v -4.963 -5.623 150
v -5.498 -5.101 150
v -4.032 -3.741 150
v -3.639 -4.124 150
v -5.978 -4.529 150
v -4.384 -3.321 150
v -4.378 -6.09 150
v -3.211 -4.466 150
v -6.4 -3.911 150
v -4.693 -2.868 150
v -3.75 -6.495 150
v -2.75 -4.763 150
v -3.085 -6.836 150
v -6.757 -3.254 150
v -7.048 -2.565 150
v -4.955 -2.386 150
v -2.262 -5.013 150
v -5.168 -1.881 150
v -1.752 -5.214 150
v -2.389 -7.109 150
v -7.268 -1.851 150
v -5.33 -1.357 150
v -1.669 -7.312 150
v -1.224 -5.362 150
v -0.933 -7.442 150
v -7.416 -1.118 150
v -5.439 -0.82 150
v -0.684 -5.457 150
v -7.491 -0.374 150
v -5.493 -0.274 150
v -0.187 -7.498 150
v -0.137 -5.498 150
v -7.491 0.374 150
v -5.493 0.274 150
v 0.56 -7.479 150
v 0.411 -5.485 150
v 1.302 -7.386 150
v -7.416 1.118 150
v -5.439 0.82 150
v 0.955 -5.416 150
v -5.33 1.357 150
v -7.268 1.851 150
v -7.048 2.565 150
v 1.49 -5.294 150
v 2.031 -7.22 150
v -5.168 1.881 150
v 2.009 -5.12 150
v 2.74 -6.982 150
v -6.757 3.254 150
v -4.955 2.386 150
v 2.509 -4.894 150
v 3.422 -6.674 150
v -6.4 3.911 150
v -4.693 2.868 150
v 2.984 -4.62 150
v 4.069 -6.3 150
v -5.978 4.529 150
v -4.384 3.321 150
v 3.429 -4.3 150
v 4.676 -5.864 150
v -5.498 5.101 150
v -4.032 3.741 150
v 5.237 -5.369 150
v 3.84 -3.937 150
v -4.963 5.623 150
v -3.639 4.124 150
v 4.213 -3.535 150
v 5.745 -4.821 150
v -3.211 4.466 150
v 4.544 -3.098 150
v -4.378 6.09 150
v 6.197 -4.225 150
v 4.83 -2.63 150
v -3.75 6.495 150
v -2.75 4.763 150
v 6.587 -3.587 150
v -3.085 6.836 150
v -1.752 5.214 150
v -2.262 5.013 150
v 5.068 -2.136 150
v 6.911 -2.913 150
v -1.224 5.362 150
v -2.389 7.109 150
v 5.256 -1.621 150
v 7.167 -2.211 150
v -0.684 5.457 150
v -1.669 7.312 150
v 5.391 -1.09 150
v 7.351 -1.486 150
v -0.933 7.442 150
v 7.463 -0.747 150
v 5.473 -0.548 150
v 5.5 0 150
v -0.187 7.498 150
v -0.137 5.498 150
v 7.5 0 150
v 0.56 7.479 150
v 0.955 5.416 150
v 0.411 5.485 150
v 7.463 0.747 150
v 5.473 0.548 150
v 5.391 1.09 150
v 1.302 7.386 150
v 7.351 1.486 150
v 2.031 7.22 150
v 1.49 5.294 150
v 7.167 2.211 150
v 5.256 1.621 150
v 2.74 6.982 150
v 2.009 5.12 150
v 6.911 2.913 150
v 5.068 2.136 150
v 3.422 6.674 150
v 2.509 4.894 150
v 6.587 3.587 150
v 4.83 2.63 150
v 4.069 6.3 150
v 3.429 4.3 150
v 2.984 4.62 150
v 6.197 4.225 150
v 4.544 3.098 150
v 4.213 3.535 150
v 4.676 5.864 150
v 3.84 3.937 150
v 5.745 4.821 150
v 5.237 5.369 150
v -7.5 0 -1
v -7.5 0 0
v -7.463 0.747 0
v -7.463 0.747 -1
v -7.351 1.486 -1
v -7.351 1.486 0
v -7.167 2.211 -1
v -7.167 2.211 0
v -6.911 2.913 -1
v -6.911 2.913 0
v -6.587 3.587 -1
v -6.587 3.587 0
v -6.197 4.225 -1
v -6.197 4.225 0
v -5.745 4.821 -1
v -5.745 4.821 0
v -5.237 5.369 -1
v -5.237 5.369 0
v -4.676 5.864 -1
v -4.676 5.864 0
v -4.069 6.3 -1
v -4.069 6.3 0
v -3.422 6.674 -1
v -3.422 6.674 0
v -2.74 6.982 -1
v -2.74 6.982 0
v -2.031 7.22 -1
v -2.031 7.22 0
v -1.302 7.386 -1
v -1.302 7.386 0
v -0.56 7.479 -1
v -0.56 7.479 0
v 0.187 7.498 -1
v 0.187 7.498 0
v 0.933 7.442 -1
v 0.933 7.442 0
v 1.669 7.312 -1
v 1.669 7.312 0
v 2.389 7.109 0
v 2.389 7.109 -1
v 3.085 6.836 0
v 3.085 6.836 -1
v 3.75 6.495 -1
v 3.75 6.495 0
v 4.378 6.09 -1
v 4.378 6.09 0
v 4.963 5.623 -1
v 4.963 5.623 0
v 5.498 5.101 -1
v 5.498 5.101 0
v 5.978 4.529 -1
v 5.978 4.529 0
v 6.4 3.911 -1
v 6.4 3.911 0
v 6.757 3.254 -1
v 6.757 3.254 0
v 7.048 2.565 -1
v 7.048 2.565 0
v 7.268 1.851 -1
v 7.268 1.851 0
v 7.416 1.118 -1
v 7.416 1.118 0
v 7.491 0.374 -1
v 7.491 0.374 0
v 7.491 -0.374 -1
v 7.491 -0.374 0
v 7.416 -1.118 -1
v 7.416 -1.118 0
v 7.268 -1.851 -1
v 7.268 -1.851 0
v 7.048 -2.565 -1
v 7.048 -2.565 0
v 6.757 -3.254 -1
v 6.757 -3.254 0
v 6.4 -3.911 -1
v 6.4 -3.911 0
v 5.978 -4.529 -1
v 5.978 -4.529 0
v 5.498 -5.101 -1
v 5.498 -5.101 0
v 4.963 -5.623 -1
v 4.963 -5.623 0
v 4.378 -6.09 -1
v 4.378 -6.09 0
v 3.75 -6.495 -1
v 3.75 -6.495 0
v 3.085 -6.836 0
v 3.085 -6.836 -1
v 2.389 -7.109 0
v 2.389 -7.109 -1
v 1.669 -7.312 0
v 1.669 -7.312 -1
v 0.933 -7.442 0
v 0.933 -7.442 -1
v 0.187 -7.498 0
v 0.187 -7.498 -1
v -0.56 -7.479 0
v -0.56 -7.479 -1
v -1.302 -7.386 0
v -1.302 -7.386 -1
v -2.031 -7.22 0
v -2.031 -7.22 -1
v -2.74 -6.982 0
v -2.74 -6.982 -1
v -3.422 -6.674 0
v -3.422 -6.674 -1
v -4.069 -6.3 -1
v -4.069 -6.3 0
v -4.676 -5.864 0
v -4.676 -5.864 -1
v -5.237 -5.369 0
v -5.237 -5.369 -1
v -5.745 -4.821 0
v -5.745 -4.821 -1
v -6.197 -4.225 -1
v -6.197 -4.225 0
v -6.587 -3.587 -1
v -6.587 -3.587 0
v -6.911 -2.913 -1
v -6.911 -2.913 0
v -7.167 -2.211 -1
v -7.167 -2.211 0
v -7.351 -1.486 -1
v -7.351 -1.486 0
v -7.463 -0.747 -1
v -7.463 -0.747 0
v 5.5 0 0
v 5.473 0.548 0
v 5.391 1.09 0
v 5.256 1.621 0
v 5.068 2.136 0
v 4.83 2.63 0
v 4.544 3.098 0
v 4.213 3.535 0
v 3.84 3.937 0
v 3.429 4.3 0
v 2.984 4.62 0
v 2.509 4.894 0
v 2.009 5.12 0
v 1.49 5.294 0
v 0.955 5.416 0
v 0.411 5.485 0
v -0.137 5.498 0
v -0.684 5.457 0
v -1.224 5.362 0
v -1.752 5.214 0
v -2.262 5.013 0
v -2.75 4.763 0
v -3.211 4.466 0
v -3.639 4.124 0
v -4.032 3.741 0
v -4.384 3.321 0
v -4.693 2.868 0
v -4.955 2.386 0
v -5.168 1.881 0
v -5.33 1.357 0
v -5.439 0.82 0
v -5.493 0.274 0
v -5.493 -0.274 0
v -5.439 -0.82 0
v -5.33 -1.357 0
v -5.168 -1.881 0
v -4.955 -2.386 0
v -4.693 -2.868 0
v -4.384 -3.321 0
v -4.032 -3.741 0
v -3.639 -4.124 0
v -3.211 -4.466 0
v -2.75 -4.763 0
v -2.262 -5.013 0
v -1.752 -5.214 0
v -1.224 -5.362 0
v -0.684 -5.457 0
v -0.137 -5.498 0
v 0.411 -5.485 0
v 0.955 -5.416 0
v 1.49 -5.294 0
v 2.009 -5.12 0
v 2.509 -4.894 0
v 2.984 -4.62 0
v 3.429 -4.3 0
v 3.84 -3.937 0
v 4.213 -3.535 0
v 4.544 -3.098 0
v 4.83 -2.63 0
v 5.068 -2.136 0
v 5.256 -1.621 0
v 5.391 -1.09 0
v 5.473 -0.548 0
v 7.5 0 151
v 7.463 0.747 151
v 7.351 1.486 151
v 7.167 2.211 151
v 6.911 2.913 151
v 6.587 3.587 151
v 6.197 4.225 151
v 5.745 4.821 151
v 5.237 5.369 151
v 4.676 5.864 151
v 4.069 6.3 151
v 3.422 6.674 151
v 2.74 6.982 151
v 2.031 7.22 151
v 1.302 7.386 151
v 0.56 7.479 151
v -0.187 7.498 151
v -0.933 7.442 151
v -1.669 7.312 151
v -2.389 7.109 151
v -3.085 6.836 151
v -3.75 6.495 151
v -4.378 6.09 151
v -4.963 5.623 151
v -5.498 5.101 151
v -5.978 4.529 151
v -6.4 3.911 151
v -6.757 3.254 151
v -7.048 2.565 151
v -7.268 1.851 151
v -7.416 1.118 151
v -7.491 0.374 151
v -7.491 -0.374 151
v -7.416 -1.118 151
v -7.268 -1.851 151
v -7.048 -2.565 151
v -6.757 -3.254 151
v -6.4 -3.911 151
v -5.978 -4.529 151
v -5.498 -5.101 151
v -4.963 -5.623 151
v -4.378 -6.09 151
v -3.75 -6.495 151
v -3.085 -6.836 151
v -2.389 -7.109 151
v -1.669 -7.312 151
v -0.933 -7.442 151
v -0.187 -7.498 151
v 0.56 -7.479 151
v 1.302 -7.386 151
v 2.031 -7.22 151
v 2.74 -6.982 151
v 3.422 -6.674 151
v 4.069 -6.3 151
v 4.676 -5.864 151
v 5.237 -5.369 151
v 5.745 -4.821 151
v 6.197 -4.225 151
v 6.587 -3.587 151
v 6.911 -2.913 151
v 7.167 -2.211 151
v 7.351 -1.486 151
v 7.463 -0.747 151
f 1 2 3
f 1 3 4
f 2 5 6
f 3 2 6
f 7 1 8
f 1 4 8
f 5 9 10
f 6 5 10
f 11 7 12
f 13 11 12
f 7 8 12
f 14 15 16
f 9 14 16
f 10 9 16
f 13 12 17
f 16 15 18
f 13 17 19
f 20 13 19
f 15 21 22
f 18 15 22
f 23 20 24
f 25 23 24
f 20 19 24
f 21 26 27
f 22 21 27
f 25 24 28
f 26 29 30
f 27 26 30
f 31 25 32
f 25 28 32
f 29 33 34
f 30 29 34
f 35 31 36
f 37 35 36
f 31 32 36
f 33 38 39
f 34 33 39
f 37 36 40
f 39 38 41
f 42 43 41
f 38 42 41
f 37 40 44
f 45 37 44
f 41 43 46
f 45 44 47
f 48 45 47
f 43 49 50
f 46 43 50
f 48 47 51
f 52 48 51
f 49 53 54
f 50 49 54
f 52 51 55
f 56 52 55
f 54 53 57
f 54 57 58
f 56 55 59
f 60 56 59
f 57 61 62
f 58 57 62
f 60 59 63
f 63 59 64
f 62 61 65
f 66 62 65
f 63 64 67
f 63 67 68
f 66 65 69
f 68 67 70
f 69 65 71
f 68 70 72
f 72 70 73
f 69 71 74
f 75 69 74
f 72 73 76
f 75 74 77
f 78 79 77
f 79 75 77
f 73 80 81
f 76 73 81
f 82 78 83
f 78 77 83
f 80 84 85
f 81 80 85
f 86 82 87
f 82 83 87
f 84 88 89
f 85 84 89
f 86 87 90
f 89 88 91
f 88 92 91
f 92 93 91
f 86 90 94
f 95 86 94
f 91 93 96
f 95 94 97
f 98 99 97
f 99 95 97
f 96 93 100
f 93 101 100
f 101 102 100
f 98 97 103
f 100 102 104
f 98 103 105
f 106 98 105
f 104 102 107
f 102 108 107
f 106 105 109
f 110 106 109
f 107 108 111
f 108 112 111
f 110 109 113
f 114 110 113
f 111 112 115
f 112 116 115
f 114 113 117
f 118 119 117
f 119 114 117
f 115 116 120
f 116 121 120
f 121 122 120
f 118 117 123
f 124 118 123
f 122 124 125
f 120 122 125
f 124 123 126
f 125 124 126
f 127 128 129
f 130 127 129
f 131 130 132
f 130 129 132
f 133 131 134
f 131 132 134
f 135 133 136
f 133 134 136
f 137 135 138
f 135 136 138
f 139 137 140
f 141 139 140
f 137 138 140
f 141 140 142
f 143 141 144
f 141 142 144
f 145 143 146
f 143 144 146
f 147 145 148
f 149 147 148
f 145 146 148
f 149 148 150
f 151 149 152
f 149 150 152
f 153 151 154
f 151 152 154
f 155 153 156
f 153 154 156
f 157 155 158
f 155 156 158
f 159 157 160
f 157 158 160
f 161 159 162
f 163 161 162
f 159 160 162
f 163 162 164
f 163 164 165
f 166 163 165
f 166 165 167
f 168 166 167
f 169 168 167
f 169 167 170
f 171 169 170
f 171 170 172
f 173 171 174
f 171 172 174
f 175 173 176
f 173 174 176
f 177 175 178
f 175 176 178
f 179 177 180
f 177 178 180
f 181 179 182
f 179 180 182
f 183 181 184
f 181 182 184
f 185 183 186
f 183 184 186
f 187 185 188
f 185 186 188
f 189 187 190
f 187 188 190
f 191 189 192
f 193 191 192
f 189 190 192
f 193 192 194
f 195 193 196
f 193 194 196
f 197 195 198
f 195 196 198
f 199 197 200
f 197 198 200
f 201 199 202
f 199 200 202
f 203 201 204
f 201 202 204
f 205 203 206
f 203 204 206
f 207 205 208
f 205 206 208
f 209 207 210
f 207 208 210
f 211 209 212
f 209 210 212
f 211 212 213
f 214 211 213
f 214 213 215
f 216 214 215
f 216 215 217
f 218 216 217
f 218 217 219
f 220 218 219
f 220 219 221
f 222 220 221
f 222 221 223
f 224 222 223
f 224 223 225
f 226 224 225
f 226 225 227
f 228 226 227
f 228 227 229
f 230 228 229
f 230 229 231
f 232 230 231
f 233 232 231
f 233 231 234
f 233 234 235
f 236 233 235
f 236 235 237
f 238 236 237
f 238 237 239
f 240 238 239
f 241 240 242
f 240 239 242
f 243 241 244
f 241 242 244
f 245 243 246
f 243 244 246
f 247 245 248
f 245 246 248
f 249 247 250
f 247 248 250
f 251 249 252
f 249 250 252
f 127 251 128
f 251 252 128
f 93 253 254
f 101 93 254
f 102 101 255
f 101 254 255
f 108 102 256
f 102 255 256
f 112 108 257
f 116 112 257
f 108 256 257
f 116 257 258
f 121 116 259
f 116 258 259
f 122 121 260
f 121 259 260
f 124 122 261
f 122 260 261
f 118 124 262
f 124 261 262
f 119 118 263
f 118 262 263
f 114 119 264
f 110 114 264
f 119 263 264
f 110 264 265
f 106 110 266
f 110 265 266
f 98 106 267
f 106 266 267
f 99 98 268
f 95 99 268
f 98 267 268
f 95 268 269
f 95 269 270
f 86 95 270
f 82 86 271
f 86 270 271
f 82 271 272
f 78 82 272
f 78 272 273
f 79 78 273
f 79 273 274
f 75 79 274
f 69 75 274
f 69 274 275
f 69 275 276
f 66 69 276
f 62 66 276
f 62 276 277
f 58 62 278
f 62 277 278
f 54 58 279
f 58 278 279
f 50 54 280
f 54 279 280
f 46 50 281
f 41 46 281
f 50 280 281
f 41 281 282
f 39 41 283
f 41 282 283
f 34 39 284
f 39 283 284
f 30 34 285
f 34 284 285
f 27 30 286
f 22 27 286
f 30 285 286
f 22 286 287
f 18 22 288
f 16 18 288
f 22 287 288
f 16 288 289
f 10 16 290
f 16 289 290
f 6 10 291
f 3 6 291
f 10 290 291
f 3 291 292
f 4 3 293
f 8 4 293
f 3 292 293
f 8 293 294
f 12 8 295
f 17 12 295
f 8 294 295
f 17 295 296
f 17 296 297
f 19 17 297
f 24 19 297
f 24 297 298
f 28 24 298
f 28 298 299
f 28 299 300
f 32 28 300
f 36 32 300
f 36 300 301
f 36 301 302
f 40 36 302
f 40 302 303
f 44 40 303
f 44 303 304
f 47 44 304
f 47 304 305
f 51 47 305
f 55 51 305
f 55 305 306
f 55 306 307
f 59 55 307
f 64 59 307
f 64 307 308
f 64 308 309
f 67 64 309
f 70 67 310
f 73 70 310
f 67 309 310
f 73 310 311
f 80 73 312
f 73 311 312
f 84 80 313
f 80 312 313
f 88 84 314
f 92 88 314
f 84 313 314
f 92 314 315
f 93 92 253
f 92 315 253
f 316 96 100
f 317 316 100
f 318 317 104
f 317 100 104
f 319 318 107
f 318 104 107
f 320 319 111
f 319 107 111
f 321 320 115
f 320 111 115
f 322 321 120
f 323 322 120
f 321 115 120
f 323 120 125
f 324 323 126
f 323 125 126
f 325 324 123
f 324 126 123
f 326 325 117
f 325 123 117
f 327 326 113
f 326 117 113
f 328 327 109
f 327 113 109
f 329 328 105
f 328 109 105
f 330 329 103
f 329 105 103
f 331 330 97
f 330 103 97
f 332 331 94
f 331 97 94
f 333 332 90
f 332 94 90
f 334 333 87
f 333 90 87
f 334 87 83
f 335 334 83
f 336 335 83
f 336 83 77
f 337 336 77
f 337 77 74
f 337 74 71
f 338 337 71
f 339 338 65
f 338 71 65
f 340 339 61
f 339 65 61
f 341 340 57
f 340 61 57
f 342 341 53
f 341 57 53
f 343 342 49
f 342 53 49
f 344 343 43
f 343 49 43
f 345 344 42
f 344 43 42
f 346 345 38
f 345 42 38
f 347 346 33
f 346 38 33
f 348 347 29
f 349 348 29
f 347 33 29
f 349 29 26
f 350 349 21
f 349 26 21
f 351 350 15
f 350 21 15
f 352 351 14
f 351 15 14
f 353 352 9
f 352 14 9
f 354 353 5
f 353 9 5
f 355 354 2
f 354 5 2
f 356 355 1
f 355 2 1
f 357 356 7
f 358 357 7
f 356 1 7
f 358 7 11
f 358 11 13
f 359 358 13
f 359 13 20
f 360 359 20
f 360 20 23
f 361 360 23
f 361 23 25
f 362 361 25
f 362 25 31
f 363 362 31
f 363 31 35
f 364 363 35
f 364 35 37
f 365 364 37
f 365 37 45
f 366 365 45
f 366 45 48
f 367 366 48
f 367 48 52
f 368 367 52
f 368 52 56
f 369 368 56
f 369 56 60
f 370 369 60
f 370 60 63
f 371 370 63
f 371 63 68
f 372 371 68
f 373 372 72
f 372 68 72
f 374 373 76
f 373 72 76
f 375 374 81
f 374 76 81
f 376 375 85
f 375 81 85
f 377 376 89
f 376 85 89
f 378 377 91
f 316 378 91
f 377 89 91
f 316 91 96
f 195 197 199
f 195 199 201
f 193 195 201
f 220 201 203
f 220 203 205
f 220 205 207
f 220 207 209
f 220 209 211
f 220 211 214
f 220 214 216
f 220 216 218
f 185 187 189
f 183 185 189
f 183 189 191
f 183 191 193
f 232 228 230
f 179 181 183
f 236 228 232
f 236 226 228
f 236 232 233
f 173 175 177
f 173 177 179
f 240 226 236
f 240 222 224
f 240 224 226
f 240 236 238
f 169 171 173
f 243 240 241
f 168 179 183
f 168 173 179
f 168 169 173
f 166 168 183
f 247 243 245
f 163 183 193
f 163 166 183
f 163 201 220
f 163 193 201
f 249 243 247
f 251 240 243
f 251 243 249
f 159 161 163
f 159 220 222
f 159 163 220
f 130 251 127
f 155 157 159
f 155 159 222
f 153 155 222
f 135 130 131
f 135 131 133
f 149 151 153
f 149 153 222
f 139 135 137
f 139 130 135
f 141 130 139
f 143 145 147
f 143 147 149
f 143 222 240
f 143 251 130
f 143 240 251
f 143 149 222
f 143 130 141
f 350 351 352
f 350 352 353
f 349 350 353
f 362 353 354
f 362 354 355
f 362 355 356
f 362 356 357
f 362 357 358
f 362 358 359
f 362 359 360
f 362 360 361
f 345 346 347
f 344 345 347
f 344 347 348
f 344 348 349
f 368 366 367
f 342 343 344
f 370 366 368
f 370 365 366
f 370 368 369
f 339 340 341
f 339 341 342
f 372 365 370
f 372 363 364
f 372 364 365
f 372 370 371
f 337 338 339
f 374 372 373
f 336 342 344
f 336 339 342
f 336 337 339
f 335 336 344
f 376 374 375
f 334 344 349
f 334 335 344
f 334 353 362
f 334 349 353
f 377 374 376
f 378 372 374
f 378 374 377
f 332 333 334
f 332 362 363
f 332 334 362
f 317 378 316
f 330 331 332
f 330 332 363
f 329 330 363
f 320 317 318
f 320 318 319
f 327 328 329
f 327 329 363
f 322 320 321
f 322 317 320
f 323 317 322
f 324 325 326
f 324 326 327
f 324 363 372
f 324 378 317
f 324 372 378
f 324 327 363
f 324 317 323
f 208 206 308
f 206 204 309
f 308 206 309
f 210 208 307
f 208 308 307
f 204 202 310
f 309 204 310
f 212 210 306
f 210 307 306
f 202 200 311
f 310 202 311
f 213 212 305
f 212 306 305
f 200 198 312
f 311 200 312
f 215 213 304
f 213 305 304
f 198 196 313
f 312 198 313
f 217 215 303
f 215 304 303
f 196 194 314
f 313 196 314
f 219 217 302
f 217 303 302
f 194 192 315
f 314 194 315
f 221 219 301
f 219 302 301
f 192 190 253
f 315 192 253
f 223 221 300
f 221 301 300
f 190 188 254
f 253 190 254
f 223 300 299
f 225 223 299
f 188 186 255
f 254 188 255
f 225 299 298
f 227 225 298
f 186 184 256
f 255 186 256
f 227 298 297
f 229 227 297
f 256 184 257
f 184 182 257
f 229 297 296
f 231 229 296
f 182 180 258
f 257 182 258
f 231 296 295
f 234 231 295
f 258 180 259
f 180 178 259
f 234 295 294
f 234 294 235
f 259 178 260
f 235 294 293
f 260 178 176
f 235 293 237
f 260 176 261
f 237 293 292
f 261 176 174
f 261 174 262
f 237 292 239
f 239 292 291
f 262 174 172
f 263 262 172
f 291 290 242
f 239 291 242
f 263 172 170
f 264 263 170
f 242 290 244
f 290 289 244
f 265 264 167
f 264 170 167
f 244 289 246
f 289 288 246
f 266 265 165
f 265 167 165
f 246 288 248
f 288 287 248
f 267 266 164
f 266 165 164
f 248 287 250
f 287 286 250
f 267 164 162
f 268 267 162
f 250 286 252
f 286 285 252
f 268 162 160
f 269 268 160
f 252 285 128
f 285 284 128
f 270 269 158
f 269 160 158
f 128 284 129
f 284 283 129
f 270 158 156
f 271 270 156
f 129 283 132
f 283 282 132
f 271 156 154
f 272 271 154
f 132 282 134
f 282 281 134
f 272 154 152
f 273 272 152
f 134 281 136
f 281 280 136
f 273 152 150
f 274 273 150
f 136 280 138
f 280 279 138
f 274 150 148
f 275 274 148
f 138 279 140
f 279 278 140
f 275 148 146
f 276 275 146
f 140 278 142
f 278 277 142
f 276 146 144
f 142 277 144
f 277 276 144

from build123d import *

# Parameters (mm, degrees)
SKETCH1_R           = 5.5
BOSS_EXTRUDE1_DEPTH = 150
SKETCH2_R           = 7.5
BOSS_EXTRUDE2_DEPTH = 1
SKETCH3_R           = 7.5
BOSS_EXTRUDE3_DEPTH = 1


with BuildPart() as part:
    # Sketch1 → Boss-Extrude1 (new body)
    with BuildSketch(Plane.XY):
        Circle(SKETCH1_R)
    extrude(amount=BOSS_EXTRUDE1_DEPTH)

    # Sketch2 → Boss-Extrude2 (add)
    with BuildSketch(Plane(origin=(0, 0, 0), x_dir=(-1, 0, 0), z_dir=(0, 0, -1))):
        Circle(SKETCH2_R)
    extrude(amount=BOSS_EXTRUDE2_DEPTH)

    # Sketch3 → Boss-Extrude3 (add)
    with BuildSketch(Plane.XY.offset(150)):
        Circle(SKETCH3_R)
    extrude(amount=BOSS_EXTRUDE3_DEPTH)


solid = part.part
